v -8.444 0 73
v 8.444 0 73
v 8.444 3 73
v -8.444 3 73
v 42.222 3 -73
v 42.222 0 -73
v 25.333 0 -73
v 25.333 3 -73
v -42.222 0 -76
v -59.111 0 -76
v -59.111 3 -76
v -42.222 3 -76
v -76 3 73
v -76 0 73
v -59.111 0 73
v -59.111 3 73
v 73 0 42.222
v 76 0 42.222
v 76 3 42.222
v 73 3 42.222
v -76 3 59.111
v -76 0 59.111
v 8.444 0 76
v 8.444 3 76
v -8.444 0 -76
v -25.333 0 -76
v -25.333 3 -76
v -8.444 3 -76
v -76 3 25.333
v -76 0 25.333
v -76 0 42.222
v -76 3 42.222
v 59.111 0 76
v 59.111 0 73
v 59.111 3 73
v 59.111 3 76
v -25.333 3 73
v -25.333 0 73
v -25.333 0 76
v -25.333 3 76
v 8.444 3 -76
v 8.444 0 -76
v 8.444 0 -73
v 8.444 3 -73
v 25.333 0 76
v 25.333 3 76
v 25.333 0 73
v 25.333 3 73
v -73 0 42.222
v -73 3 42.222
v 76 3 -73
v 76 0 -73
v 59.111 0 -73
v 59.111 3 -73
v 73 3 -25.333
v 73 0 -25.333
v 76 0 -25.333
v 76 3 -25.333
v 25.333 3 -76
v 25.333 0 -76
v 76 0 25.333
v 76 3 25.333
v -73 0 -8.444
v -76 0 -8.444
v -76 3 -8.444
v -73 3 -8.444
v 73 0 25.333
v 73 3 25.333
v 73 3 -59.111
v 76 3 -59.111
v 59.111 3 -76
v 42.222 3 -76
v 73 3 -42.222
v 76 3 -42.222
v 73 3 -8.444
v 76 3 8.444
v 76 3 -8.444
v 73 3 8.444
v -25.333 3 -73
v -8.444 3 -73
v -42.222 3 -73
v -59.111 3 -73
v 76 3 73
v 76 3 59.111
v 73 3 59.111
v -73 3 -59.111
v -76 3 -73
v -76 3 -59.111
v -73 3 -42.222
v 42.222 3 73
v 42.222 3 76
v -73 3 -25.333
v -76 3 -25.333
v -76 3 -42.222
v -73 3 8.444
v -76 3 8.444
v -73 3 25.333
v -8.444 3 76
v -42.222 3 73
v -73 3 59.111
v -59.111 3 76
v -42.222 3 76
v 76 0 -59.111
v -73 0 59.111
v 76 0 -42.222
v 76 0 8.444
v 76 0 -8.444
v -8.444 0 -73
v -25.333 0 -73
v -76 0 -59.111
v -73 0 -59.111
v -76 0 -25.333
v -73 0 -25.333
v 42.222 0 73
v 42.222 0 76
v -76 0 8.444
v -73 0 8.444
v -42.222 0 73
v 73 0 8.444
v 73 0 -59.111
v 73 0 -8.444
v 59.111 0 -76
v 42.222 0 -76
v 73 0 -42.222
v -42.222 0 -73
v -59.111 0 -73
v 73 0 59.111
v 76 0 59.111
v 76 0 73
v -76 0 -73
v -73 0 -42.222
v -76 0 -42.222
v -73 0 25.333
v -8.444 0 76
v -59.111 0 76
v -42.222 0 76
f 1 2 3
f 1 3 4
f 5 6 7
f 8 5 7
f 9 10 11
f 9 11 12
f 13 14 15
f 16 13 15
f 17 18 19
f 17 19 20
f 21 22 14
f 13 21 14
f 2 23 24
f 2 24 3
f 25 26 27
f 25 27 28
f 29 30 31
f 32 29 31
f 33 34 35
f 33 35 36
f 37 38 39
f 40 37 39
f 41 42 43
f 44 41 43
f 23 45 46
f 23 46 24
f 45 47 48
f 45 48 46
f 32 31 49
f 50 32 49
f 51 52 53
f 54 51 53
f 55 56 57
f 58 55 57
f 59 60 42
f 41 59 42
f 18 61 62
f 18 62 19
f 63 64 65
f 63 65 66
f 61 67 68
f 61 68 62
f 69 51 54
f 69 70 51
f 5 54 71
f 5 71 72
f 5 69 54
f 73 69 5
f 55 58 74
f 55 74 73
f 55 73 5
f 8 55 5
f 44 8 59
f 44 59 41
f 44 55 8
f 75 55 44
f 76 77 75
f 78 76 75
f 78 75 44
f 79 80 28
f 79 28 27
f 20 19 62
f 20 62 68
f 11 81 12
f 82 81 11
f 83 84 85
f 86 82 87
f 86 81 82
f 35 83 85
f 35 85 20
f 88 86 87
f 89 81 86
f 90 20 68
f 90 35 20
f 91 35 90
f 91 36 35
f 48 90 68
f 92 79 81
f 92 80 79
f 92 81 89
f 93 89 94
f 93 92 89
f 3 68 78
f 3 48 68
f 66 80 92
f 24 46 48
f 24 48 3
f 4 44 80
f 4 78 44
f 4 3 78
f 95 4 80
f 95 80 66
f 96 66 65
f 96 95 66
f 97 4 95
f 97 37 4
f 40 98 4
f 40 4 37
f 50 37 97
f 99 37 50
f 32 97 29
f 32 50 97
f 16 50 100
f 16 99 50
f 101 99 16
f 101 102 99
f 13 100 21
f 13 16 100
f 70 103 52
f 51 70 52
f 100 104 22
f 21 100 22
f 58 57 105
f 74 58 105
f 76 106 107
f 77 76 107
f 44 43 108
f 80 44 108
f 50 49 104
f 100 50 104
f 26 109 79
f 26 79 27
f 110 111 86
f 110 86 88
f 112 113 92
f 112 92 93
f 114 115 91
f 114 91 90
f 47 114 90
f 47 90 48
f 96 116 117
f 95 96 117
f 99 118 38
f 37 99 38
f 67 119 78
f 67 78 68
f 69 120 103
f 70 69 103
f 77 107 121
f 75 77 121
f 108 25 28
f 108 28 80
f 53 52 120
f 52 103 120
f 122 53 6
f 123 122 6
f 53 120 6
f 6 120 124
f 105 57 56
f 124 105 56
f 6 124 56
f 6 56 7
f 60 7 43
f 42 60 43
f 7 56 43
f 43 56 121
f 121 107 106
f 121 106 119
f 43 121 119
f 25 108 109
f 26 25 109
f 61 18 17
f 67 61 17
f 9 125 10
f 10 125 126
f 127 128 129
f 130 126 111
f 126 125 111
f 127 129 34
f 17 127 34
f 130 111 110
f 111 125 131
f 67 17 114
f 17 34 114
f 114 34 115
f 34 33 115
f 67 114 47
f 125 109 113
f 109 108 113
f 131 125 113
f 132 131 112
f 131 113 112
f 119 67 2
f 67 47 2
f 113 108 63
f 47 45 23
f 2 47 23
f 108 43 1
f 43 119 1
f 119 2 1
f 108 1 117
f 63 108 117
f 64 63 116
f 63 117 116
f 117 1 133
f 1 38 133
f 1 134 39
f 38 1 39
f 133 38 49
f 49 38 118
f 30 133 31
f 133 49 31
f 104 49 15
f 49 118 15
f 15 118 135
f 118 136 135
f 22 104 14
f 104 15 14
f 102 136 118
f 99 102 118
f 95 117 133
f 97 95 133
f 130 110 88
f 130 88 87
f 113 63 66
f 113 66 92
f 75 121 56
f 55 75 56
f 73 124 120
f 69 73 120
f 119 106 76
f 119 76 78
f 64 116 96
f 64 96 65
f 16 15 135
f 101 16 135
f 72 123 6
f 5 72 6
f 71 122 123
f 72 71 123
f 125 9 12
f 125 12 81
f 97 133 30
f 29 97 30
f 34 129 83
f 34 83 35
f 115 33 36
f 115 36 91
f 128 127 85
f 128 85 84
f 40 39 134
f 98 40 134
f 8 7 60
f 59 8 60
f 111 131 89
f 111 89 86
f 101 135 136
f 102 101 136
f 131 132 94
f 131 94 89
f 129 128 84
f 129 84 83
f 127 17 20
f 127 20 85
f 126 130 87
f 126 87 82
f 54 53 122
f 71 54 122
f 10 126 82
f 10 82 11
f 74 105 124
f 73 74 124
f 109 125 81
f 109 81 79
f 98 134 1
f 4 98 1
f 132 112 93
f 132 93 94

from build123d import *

# Parameters (mm, degrees)
BOSS_EXTRUDE1_DEPTH                      = 3
MIRROR1_AT_THE_SECOND_PLANE_COPY_1_DEPTH = 3


with BuildPart() as part:
    # Sketch1 → Boss-Extrude1 (new body)
    with BuildSketch(Plane(origin=(0, 0, 0), x_dir=(1, 0, 0), z_dir=(0, 1, 0))):
        Polygon((-76, -73), (-59.111111111, -73), (-59.111111111, -76), (-42.222222222, -76), (-42.222222222, -73), (-25.333333333, -73), (-25.333333333, -76), (-8.444444444, -76), (-8.444444444, -73), (0, -73), (0, 0), (-76, 0), (-76, -8.444444444), (-73, -8.444444444), (-73, -25.333333333), (-76, -25.333333333), (-76, -42.222222222), (-73, -42.222222222), (-73, -59.111111111), (-76, -59.111111111), align=None)
    boss_extrude1 = extrude(amount=BOSS_EXTRUDE1_DEPTH)



with BuildPart() as mirror1_1:
    # Mirror1: Boss-Extrude1 across plane
    add(boss_extrude1.mirror(Plane(origin=(0, 0, 0), x_dir=(0, 0, 1), z_dir=(1, 0, 0))))


with BuildPart() as part_1:
    add(part.part)

    add(mirror1_1.part)  # Mirror1 at the second plane merges Mirror1_1
    # Mirror1 at the second plane: Boss-Extrude1 across plane
    add(boss_extrude1.mirror(Plane.XY))

    # Mirror1 at the second plane copy 1 sketc → Mirror1 at the second plane copy 1 (add)
    with BuildSketch(Plane(origin=(0, 0, 0), x_dir=(-1, 0, 0), z_dir=(0, 1, 0))):
        Polygon((-76, -73), (-59.111111111, -73), (-59.111111111, -76), (-42.222222222, -76), (-42.222222222, -73), (-25.333333333, -73), (-25.333333333, -76), (-8.444444444, -76), (-8.444444444, -73), (0, -73), (0, 0), (-76, 0), (-76, -8.444444444), (-73, -8.444444444), (-73, -25.333333333), (-76, -25.333333333), (-76, -42.222222222), (-73, -42.222222222), (-73, -59.111111111), (-76, -59.111111111), align=None)
    extrude(amount=MIRROR1_AT_THE_SECOND_PLANE_COPY_1_DEPTH)


solid = part_1.part
